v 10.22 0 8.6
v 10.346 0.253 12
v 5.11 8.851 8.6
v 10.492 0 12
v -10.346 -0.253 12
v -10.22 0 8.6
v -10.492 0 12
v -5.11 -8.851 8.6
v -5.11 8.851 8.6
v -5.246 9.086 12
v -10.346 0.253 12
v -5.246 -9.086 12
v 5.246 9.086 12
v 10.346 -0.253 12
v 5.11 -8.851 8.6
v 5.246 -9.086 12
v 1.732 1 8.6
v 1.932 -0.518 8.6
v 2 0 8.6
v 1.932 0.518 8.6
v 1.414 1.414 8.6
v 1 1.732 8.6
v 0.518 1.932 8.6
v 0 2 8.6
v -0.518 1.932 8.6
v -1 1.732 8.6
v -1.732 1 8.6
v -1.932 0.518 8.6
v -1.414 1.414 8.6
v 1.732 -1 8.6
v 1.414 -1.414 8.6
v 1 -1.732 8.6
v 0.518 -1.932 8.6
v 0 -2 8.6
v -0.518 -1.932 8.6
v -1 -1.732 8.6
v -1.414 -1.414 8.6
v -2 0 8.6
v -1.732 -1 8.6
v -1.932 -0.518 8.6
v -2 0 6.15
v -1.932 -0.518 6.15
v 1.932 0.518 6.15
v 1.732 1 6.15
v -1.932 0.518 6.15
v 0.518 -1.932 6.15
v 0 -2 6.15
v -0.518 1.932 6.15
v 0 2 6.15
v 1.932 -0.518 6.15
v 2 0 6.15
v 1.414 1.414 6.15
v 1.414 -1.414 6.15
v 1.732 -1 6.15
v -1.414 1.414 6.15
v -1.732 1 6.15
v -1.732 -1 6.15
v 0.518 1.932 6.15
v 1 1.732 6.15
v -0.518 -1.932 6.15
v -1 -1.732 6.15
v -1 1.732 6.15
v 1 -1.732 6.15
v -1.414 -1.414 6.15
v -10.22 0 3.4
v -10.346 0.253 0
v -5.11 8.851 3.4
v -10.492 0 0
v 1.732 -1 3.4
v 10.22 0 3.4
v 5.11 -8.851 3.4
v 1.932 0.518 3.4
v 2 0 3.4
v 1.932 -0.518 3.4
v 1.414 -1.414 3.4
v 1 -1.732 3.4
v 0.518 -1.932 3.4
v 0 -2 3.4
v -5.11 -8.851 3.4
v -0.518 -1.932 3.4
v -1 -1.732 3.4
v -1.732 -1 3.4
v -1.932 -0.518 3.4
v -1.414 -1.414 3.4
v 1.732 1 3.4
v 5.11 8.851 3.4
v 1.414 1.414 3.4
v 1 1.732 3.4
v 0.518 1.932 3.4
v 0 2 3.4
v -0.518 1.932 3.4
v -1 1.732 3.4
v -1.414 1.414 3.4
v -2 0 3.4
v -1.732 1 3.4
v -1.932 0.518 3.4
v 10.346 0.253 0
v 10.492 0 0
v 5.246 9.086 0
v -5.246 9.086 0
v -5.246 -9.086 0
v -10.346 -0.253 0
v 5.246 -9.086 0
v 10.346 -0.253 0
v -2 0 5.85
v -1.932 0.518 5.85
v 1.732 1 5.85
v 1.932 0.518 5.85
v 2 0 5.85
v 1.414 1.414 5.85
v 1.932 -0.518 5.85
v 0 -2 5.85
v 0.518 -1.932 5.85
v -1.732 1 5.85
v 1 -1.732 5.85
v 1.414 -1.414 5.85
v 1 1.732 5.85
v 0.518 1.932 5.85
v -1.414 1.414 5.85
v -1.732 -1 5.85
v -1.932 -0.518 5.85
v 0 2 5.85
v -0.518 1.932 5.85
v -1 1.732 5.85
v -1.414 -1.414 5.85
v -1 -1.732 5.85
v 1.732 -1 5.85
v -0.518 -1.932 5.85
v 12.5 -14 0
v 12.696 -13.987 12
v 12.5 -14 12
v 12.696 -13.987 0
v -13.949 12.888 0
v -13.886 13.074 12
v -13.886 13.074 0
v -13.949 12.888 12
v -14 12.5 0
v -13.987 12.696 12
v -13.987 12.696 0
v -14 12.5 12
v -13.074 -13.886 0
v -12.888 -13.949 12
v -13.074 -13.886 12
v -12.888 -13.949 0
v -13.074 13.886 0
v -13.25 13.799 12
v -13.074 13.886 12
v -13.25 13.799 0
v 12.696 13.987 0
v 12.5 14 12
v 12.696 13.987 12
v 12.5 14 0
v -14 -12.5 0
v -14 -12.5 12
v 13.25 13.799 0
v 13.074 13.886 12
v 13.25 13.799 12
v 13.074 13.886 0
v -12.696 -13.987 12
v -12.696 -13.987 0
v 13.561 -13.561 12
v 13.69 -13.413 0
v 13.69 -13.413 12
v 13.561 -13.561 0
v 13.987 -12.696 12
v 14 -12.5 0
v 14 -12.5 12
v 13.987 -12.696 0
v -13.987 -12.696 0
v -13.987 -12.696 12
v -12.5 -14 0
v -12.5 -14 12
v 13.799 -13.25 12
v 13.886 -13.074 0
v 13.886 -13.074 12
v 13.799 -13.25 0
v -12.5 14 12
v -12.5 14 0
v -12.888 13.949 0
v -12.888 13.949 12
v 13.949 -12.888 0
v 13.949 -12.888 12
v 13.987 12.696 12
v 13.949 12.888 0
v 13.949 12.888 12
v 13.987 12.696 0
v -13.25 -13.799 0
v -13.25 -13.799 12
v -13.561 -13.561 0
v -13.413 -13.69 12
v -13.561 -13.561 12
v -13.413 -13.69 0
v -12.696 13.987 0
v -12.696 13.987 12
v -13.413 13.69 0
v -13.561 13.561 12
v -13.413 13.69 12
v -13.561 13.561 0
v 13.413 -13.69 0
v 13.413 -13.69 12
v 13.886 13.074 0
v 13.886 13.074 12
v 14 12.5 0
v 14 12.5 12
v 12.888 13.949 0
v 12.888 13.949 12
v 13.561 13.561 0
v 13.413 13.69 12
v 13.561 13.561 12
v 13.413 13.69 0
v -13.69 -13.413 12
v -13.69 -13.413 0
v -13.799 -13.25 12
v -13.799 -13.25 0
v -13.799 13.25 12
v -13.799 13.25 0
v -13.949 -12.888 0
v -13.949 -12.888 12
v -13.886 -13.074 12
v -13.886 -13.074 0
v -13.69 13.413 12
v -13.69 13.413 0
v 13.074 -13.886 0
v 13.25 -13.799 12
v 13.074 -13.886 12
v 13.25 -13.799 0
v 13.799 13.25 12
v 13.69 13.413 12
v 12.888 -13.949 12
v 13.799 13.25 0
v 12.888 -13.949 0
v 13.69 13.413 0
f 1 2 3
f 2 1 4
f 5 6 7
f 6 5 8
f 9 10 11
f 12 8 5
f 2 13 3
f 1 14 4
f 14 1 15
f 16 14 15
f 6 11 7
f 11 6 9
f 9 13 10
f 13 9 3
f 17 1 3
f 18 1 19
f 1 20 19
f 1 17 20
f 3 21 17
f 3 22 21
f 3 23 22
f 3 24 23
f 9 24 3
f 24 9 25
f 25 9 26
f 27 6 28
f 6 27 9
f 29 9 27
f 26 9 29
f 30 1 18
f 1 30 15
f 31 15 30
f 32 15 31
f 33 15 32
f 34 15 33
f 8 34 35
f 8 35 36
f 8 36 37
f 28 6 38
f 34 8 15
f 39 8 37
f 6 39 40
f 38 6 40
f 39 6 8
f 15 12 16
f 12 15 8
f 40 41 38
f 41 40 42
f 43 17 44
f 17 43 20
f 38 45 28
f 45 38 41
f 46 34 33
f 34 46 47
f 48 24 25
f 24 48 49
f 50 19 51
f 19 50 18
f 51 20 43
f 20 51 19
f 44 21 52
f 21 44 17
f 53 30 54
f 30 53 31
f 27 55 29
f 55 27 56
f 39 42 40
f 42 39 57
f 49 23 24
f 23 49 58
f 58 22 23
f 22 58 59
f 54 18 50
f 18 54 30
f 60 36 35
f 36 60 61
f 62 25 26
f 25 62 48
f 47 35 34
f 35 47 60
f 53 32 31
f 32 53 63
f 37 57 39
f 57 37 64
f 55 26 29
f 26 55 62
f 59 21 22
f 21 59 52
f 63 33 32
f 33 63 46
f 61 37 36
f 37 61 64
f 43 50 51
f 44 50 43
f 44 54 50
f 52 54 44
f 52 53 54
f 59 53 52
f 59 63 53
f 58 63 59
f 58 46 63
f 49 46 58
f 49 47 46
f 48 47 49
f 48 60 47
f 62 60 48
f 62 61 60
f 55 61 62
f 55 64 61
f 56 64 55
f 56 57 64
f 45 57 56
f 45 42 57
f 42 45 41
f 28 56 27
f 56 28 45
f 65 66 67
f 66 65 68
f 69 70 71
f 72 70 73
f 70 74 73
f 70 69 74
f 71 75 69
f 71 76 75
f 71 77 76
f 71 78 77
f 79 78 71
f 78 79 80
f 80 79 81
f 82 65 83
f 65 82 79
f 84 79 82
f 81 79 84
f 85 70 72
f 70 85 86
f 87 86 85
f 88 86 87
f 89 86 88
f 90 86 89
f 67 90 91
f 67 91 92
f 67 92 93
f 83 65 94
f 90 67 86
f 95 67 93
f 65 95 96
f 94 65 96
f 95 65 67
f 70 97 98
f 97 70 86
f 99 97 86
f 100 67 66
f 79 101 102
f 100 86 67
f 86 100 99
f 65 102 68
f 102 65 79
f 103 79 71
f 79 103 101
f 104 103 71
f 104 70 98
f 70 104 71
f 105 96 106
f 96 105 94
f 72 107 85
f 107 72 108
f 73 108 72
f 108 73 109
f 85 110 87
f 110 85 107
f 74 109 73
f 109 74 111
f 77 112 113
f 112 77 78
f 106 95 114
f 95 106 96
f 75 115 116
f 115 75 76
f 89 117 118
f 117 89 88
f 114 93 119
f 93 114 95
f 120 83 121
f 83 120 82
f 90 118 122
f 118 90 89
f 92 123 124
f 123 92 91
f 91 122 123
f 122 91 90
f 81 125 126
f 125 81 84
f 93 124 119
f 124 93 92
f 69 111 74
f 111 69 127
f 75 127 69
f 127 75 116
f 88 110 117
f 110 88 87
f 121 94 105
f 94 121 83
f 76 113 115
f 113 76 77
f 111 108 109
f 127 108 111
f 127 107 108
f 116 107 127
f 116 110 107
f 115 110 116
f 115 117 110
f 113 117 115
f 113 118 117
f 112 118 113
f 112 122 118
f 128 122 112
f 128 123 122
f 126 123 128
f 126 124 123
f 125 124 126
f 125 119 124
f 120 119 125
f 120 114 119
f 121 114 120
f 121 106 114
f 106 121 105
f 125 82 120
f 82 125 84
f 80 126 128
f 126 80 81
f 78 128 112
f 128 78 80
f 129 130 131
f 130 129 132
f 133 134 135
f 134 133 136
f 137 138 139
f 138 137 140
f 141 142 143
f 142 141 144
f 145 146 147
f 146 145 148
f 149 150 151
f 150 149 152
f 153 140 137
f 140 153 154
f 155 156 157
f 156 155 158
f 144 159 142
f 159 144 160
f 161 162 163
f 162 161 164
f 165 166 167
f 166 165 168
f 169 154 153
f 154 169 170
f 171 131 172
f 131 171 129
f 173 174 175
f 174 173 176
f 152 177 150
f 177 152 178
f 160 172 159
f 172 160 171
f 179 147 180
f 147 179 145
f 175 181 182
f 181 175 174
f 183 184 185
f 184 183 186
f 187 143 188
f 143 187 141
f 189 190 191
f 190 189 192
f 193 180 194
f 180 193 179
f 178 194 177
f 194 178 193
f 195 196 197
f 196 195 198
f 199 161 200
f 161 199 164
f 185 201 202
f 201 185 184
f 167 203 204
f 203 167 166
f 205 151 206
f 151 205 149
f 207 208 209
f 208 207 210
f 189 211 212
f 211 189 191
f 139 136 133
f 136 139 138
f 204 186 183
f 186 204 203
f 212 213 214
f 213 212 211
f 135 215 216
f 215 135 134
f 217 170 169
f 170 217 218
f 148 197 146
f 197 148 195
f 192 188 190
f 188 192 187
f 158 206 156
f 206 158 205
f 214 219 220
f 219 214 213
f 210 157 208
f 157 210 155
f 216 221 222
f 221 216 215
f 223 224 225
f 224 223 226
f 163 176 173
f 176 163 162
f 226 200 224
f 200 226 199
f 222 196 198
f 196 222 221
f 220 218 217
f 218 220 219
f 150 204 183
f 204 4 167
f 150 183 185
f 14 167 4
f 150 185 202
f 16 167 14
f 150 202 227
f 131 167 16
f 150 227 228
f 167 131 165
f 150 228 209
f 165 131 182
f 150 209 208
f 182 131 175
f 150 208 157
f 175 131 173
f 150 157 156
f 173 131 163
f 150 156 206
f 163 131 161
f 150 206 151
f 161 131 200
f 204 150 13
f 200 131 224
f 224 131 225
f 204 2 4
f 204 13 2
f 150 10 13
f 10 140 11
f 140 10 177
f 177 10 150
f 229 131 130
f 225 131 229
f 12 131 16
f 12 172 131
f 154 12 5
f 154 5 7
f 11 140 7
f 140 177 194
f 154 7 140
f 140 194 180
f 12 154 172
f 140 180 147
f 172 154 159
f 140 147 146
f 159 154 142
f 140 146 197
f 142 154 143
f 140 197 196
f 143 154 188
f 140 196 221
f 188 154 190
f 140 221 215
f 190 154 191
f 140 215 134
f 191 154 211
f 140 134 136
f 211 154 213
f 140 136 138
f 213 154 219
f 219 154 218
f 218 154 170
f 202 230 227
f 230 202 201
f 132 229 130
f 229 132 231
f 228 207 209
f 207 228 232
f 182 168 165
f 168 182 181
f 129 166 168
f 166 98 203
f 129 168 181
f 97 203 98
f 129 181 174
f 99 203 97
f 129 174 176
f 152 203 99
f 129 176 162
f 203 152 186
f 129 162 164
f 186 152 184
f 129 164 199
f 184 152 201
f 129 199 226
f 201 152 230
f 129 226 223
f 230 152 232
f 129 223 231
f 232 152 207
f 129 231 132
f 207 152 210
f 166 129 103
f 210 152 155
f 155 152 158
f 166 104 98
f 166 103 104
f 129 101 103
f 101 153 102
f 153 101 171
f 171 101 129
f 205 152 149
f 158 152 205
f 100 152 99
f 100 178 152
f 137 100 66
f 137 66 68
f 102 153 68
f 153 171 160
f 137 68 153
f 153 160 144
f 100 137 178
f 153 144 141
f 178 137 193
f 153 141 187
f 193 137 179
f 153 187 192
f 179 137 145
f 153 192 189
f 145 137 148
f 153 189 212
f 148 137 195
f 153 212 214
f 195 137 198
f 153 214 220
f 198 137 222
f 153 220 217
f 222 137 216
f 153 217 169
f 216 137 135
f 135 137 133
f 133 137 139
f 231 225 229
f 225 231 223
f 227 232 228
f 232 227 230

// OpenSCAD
// file: rm_common.scad
// RobotMind direct-join hex construction system.
// All dimensions are millimetres; tune the two fits after printing coupons.
$fn = 48;

RM_UNIT = 42;
RM_PANEL_T = 12;

// One carrier joint: a progressive hex press fit plus an optional M3 lock.
RM_SOCKET_DEPTH = 3.4;
RM_HEX_R = 10.5;
RM_HEX_TAPER = 0.28;
RM_HEX_ENTRY_CLEARANCE = 0.10;
RM_HEX_GRIP = 0.20;
RM_HEX_X = sqrt(3) * RM_HEX_R;
RM_HEX_Y = 1.5 * RM_HEX_R;

// Panel-to-panel 90° box joint: integral tabs enter open edge slots.
RM_JOIN_PITCH = 14;
RM_JOIN_LENGTH = 3.0;
RM_JOIN_W = 8;
RM_JOIN_CLEARANCE = 0.06;
RM_M3_CLEARANCE = 3.4;
RM_M3_PILOT = 2.6;
RM_M3_HEAD = 6.2;
RM_M3_INSERT_HOLE = 4.0; // tune for the chosen M3 heat-set insert
RM_M3_INSERT_LENGTH = 5.0;
RM_M3_MEMBRANE = 0.3;
RM_M3_BLIND_DEPTH =
  (RM_PANEL_T-2*RM_SOCKET_DEPTH-RM_M3_MEMBRANE)/2;

assert(RM_PANEL_T > 2 * RM_SOCKET_DEPTH,
       "Panel needs a solid web between its two carrier sockets");
assert(RM_M3_BLIND_DEPTH > 0,
       "Panel is too thin for double-sided M3 insert pockets");
assert(2*RM_M3_BLIND_DEPTH+RM_M3_MEMBRANE >= RM_M3_INSERT_LENGTH,
       "Panel web is too thin for the M3 insert");

module rounded_box(size=[20,20,3], r=2, center=false) {
  x=size[0]; y=size[1]; z=size[2];
  translate(center ? [-x/2,-y/2,-z/2] : [0,0,0])
    linear_extrude(height=z)
      offset(r=r) offset(delta=-r) square([x,y]);
}

module print_on_x_edge(span) {
  translate([0,0,span/2]) rotate([0,90,0]) children();
}

module print_on_y_edge(span) {
  translate([0,0,span/2]) rotate([90,0,0]) children();
}

module hex_frustum(r1=RM_HEX_R, r2=RM_HEX_R, h=1) {
  cylinder(r1=r1,r2=r2,h=h,$fn=6);
}

module top_socket_cut() {
  union() {
    translate([0,0,RM_PANEL_T-RM_SOCKET_DEPTH])
      hex_frustum(RM_HEX_R-RM_HEX_TAPER,
                   RM_HEX_R,
                   RM_SOCKET_DEPTH+0.1);
    translate([0,0,RM_PANEL_T-RM_SOCKET_DEPTH-RM_M3_BLIND_DEPTH])
      cylinder(h=RM_M3_BLIND_DEPTH+0.1,d=RM_M3_INSERT_HOLE,$fn=24);
  }
}

module bottom_socket_cut() {
  union() {
    translate([0,0,-0.1])
      hex_frustum(RM_HEX_R,
                   RM_HEX_R-RM_HEX_TAPER,
                   RM_SOCKET_DEPTH+0.1);
    translate([0,0,RM_SOCKET_DEPTH-0.1])
      cylinder(h=RM_M3_BLIND_DEPTH+0.1,d=RM_M3_INSERT_HOLE,$fn=24);
  }
}

module socket_pair() {
  top_socket_cut();
  bottom_socket_cut();
}

// Dense pointy-top honeycomb, clipped to leave material around every edge.
module dense_socket_grid(size=[2*RM_UNIT,2*RM_UNIT]) {
  rows=ceil(size[1]/RM_HEX_Y)+2;
  cols=ceil(size[0]/RM_HEX_X)+2;
  margin=2;
  for(row=[-rows:rows], col=[-cols:cols]) {
    y=(row+0.5)*RM_HEX_Y;
    x=(col + ((abs(row)%2)==1 ? 0.5 : 0))*RM_HEX_X;
    if(abs(x)+RM_HEX_X/2 <= size[0]/2-margin &&
       abs(y)+RM_HEX_R <= size[1]/2-margin)
      translate([x,y,0]) socket_pair();
  }
}

function join_index(p,edge_len) =
  round((p+edge_len/2-RM_JOIN_PITCH/2)/RM_JOIN_PITCH);
function is_m3_join(p,edge_len) = join_index(p,edge_len)%3 == 1;

// Integral rectangular tabs on an A edge (+Y in local coordinates).
module male_edge(edge_len, panel_half) {
  for(p=[-edge_len/2+RM_JOIN_PITCH/2:
         RM_JOIN_PITCH:
         edge_len/2-RM_JOIN_PITCH/2])
    translate([p-RM_JOIN_W/2,panel_half-0.05,0])
      cube([RM_JOIN_W,RM_JOIN_LENGTH+0.05,RM_PANEL_T]);
}

// Blind thread-forming pilots continue through selected tabs into the edge.
module male_edge_m3_cuts(edge_len, panel_half) {
  for(p=[-edge_len/2+RM_JOIN_PITCH/2:
         RM_JOIN_PITCH:
         edge_len/2-RM_JOIN_PITCH/2])
    if(is_m3_join(p,edge_len))
      translate([p,panel_half-4,RM_PANEL_T/2])
        rotate([-90,0,0])
          cylinder(h=RM_JOIN_LENGTH+4.2,d=RM_M3_PILOT,$fn=24);
}

// Female B edge (-Y): open slots accept tabs from either face at 90°.
module female_edge_cuts(edge_len, panel_half) {
  for(p=[-edge_len/2+RM_JOIN_PITCH/2:
         RM_JOIN_PITCH:
         edge_len/2-RM_JOIN_PITCH/2]) {
    translate([p-RM_JOIN_W/2-RM_JOIN_CLEARANCE,
               -panel_half-0.1,-0.1])
      cube([RM_JOIN_W+2*RM_JOIN_CLEARANCE,
            RM_PANEL_T+RM_JOIN_CLEARANCE,
            RM_JOIN_LENGTH+0.1]);
    translate([p-RM_JOIN_W/2-RM_JOIN_CLEARANCE,
               -panel_half-0.1,RM_PANEL_T-RM_JOIN_LENGTH])
      cube([RM_JOIN_W+2*RM_JOIN_CLEARANCE,
            RM_PANEL_T+RM_JOIN_CLEARANCE,
            RM_JOIN_LENGTH+0.1]);
    if(is_m3_join(p,edge_len)) {
      translate([p,-panel_half+RM_PANEL_T/2,-0.1])
        cylinder(h=RM_PANEL_T+0.2,d=RM_M3_CLEARANCE,$fn=24);
    }
  }
}

// Identical panels: tabs on +X/+Y and 90° slots on -X/-Y.
module dock_panel(size=[2*RM_UNIT,2*RM_UNIT]) {
  assert(size[0] % RM_UNIT == 0 && size[1] % RM_UNIT == 0,
         "Panel dimensions must be whole 42 mm units");
  difference() {
    union() {
      translate([-size[0]/2,-size[1]/2,0])
        rounded_box([size[0],size[1],RM_PANEL_T],1.5);
      male_edge(size[0],size[1]/2);
      rotate([0,0,-90]) male_edge(size[1],size[0]/2);
    }
    dense_socket_grid(size);
    female_edge_cuts(size[0],size[1]/2);
    rotate([0,0,-90]) female_edge_cuts(size[1],size[0]/2);
    male_edge_m3_cuts(size[0],size[1]/2);
    rotate([0,0,-90]) male_edge_m3_cuts(size[1],size[0]/2);
  }
}

// The tip enters freely; the last fraction of travel supplies the grip.
module integral_hex_plug(at=[0,0]) {
  translate([at[0],at[1],-RM_SOCKET_DEPTH+0.2])
    hex_frustum(RM_HEX_R-RM_HEX_TAPER-RM_HEX_ENTRY_CLEARANCE,
                 RM_HEX_R+RM_HEX_GRIP,
                 RM_SOCKET_DEPTH+0.1);
}

// Adds one or more identical plugs. M3 is optional: the press fit works alone.
module carrier_mount(points=[[0,0]]) {
  difference() {
    union() {
      children();
      for(at=points) integral_hex_plug(at);
    }
    for(at=points) {
      translate([at[0],at[1],-RM_SOCKET_DEPTH])
        cylinder(h=RM_SOCKET_DEPTH+100,d=RM_M3_CLEARANCE,$fn=24);
      translate([at[0],at[1],-0.01])
        cylinder(h=2.21,d=RM_M3_HEAD,$fn=32);
    }
  }
}

module sensor_carrier(pcb=[20,20], wall=1.7, floor=1.8, clearance=0.5) {
  W=pcb[0]+2*(wall+clearance);
  L=pcb[1]+2*(wall+clearance);
  assert(W >= 2*(RM_HEX_R+RM_HEX_GRIP),
         "Carrier is narrower than its integral hex plug");
  carrier_mount() union() {
    translate([-W/2,-L/2,0]) difference() {
      rounded_box([W,L,floor+3.1],2);
      translate([wall,wall,floor])
        rounded_box([pcb[0]+2*clearance,pcb[1]+2*clearance,5],1);
      translate([W/2-6,-0.2,floor+0.5]) cube([12,wall+1,3.5]);
    }
    for(x=[-W/2+2.2,W/2-2.2], y=[-L/2+2.2,L/2-2.2])
      translate([x,y,floor+2.5]) cylinder(h=1.3,d=2.2);
  }
}

module tag_insert(tag=[60,60], border=3, t=1) {
  W=tag[0]+2*border; H=tag[1]+2*border;
  union() {
    translate([-W/2,-H/2,0]) rounded_box([W,H,t],1.2);
    translate([-8,-H/2-4,0]) rounded_box([16,5,t],1.2);
  }
}

module tag_insert_rails(tag=[60,60], border=4, rail=1.5,
                        depth=2.2, clearance=0.25, lip=0.8, lip_t=0.6) {
  W=tag[0]+2*border; H=tag[1]+2*border;
  for(sx=[-1,1]) {
    x=sx>0 ? W/2+clearance : -W/2-clearance-rail;
    translate([x,-H/2-clearance,0])
      cube([rail,H+2*clearance+rail,depth]);
    translate([sx>0 ? W/2-lip : -W/2-clearance-rail,
               -H/2-clearance,depth-lip_t])
      cube([rail+clearance+lip,H+2*clearance+rail,lip_t]);
  }
  translate([-W/2-clearance-rail,H/2+clearance,0])
    cube([W+2*(clearance+rail),rail,depth]);
}
// main file
include <rm_common.scad>

PART="hex_socket"; // printable coupons or preview_90
assert(PART=="hex_socket" || PART=="hex_plug" ||
       PART=="edge_male" || PART=="edge_female" ||
       PART=="preview_90",
       "Unknown fit-test part");

module hex_socket_coupon() {
  difference() {
    translate([-14,-14,0]) rounded_box([28,28,RM_PANEL_T],1.5);
    socket_pair();
  }
}

module hex_plug_coupon() {
  carrier_mount() {
    translate([-14,-14,0]) rounded_box([28,28,2],1.5);
  }
}

module edge_male_coupon() {
  difference() {
    union() {
      translate([-14,-10,0]) rounded_box([28,20,RM_PANEL_T],1);
      male_edge(28,10);
    }
    male_edge_m3_cuts(28,10);
  }
}

module edge_female_coupon() {
  difference() {
    translate([-14,-10,0]) rounded_box([28,20,RM_PANEL_T],1);
    female_edge_cuts(28,10);
  }
}

module preview_90() {
  color("lightsteelblue") edge_female_coupon();
  color("gold") translate([0,-10,10+RM_PANEL_T]) rotate([-90,0,0])
    edge_male_coupon();
}

if(PART=="hex_socket") hex_socket_coupon();
if(PART=="hex_plug") print_on_y_edge(28) hex_plug_coupon();
if(PART=="edge_male") edge_male_coupon();
if(PART=="edge_female") edge_female_coupon();
if(PART=="preview_90") preview_90();
